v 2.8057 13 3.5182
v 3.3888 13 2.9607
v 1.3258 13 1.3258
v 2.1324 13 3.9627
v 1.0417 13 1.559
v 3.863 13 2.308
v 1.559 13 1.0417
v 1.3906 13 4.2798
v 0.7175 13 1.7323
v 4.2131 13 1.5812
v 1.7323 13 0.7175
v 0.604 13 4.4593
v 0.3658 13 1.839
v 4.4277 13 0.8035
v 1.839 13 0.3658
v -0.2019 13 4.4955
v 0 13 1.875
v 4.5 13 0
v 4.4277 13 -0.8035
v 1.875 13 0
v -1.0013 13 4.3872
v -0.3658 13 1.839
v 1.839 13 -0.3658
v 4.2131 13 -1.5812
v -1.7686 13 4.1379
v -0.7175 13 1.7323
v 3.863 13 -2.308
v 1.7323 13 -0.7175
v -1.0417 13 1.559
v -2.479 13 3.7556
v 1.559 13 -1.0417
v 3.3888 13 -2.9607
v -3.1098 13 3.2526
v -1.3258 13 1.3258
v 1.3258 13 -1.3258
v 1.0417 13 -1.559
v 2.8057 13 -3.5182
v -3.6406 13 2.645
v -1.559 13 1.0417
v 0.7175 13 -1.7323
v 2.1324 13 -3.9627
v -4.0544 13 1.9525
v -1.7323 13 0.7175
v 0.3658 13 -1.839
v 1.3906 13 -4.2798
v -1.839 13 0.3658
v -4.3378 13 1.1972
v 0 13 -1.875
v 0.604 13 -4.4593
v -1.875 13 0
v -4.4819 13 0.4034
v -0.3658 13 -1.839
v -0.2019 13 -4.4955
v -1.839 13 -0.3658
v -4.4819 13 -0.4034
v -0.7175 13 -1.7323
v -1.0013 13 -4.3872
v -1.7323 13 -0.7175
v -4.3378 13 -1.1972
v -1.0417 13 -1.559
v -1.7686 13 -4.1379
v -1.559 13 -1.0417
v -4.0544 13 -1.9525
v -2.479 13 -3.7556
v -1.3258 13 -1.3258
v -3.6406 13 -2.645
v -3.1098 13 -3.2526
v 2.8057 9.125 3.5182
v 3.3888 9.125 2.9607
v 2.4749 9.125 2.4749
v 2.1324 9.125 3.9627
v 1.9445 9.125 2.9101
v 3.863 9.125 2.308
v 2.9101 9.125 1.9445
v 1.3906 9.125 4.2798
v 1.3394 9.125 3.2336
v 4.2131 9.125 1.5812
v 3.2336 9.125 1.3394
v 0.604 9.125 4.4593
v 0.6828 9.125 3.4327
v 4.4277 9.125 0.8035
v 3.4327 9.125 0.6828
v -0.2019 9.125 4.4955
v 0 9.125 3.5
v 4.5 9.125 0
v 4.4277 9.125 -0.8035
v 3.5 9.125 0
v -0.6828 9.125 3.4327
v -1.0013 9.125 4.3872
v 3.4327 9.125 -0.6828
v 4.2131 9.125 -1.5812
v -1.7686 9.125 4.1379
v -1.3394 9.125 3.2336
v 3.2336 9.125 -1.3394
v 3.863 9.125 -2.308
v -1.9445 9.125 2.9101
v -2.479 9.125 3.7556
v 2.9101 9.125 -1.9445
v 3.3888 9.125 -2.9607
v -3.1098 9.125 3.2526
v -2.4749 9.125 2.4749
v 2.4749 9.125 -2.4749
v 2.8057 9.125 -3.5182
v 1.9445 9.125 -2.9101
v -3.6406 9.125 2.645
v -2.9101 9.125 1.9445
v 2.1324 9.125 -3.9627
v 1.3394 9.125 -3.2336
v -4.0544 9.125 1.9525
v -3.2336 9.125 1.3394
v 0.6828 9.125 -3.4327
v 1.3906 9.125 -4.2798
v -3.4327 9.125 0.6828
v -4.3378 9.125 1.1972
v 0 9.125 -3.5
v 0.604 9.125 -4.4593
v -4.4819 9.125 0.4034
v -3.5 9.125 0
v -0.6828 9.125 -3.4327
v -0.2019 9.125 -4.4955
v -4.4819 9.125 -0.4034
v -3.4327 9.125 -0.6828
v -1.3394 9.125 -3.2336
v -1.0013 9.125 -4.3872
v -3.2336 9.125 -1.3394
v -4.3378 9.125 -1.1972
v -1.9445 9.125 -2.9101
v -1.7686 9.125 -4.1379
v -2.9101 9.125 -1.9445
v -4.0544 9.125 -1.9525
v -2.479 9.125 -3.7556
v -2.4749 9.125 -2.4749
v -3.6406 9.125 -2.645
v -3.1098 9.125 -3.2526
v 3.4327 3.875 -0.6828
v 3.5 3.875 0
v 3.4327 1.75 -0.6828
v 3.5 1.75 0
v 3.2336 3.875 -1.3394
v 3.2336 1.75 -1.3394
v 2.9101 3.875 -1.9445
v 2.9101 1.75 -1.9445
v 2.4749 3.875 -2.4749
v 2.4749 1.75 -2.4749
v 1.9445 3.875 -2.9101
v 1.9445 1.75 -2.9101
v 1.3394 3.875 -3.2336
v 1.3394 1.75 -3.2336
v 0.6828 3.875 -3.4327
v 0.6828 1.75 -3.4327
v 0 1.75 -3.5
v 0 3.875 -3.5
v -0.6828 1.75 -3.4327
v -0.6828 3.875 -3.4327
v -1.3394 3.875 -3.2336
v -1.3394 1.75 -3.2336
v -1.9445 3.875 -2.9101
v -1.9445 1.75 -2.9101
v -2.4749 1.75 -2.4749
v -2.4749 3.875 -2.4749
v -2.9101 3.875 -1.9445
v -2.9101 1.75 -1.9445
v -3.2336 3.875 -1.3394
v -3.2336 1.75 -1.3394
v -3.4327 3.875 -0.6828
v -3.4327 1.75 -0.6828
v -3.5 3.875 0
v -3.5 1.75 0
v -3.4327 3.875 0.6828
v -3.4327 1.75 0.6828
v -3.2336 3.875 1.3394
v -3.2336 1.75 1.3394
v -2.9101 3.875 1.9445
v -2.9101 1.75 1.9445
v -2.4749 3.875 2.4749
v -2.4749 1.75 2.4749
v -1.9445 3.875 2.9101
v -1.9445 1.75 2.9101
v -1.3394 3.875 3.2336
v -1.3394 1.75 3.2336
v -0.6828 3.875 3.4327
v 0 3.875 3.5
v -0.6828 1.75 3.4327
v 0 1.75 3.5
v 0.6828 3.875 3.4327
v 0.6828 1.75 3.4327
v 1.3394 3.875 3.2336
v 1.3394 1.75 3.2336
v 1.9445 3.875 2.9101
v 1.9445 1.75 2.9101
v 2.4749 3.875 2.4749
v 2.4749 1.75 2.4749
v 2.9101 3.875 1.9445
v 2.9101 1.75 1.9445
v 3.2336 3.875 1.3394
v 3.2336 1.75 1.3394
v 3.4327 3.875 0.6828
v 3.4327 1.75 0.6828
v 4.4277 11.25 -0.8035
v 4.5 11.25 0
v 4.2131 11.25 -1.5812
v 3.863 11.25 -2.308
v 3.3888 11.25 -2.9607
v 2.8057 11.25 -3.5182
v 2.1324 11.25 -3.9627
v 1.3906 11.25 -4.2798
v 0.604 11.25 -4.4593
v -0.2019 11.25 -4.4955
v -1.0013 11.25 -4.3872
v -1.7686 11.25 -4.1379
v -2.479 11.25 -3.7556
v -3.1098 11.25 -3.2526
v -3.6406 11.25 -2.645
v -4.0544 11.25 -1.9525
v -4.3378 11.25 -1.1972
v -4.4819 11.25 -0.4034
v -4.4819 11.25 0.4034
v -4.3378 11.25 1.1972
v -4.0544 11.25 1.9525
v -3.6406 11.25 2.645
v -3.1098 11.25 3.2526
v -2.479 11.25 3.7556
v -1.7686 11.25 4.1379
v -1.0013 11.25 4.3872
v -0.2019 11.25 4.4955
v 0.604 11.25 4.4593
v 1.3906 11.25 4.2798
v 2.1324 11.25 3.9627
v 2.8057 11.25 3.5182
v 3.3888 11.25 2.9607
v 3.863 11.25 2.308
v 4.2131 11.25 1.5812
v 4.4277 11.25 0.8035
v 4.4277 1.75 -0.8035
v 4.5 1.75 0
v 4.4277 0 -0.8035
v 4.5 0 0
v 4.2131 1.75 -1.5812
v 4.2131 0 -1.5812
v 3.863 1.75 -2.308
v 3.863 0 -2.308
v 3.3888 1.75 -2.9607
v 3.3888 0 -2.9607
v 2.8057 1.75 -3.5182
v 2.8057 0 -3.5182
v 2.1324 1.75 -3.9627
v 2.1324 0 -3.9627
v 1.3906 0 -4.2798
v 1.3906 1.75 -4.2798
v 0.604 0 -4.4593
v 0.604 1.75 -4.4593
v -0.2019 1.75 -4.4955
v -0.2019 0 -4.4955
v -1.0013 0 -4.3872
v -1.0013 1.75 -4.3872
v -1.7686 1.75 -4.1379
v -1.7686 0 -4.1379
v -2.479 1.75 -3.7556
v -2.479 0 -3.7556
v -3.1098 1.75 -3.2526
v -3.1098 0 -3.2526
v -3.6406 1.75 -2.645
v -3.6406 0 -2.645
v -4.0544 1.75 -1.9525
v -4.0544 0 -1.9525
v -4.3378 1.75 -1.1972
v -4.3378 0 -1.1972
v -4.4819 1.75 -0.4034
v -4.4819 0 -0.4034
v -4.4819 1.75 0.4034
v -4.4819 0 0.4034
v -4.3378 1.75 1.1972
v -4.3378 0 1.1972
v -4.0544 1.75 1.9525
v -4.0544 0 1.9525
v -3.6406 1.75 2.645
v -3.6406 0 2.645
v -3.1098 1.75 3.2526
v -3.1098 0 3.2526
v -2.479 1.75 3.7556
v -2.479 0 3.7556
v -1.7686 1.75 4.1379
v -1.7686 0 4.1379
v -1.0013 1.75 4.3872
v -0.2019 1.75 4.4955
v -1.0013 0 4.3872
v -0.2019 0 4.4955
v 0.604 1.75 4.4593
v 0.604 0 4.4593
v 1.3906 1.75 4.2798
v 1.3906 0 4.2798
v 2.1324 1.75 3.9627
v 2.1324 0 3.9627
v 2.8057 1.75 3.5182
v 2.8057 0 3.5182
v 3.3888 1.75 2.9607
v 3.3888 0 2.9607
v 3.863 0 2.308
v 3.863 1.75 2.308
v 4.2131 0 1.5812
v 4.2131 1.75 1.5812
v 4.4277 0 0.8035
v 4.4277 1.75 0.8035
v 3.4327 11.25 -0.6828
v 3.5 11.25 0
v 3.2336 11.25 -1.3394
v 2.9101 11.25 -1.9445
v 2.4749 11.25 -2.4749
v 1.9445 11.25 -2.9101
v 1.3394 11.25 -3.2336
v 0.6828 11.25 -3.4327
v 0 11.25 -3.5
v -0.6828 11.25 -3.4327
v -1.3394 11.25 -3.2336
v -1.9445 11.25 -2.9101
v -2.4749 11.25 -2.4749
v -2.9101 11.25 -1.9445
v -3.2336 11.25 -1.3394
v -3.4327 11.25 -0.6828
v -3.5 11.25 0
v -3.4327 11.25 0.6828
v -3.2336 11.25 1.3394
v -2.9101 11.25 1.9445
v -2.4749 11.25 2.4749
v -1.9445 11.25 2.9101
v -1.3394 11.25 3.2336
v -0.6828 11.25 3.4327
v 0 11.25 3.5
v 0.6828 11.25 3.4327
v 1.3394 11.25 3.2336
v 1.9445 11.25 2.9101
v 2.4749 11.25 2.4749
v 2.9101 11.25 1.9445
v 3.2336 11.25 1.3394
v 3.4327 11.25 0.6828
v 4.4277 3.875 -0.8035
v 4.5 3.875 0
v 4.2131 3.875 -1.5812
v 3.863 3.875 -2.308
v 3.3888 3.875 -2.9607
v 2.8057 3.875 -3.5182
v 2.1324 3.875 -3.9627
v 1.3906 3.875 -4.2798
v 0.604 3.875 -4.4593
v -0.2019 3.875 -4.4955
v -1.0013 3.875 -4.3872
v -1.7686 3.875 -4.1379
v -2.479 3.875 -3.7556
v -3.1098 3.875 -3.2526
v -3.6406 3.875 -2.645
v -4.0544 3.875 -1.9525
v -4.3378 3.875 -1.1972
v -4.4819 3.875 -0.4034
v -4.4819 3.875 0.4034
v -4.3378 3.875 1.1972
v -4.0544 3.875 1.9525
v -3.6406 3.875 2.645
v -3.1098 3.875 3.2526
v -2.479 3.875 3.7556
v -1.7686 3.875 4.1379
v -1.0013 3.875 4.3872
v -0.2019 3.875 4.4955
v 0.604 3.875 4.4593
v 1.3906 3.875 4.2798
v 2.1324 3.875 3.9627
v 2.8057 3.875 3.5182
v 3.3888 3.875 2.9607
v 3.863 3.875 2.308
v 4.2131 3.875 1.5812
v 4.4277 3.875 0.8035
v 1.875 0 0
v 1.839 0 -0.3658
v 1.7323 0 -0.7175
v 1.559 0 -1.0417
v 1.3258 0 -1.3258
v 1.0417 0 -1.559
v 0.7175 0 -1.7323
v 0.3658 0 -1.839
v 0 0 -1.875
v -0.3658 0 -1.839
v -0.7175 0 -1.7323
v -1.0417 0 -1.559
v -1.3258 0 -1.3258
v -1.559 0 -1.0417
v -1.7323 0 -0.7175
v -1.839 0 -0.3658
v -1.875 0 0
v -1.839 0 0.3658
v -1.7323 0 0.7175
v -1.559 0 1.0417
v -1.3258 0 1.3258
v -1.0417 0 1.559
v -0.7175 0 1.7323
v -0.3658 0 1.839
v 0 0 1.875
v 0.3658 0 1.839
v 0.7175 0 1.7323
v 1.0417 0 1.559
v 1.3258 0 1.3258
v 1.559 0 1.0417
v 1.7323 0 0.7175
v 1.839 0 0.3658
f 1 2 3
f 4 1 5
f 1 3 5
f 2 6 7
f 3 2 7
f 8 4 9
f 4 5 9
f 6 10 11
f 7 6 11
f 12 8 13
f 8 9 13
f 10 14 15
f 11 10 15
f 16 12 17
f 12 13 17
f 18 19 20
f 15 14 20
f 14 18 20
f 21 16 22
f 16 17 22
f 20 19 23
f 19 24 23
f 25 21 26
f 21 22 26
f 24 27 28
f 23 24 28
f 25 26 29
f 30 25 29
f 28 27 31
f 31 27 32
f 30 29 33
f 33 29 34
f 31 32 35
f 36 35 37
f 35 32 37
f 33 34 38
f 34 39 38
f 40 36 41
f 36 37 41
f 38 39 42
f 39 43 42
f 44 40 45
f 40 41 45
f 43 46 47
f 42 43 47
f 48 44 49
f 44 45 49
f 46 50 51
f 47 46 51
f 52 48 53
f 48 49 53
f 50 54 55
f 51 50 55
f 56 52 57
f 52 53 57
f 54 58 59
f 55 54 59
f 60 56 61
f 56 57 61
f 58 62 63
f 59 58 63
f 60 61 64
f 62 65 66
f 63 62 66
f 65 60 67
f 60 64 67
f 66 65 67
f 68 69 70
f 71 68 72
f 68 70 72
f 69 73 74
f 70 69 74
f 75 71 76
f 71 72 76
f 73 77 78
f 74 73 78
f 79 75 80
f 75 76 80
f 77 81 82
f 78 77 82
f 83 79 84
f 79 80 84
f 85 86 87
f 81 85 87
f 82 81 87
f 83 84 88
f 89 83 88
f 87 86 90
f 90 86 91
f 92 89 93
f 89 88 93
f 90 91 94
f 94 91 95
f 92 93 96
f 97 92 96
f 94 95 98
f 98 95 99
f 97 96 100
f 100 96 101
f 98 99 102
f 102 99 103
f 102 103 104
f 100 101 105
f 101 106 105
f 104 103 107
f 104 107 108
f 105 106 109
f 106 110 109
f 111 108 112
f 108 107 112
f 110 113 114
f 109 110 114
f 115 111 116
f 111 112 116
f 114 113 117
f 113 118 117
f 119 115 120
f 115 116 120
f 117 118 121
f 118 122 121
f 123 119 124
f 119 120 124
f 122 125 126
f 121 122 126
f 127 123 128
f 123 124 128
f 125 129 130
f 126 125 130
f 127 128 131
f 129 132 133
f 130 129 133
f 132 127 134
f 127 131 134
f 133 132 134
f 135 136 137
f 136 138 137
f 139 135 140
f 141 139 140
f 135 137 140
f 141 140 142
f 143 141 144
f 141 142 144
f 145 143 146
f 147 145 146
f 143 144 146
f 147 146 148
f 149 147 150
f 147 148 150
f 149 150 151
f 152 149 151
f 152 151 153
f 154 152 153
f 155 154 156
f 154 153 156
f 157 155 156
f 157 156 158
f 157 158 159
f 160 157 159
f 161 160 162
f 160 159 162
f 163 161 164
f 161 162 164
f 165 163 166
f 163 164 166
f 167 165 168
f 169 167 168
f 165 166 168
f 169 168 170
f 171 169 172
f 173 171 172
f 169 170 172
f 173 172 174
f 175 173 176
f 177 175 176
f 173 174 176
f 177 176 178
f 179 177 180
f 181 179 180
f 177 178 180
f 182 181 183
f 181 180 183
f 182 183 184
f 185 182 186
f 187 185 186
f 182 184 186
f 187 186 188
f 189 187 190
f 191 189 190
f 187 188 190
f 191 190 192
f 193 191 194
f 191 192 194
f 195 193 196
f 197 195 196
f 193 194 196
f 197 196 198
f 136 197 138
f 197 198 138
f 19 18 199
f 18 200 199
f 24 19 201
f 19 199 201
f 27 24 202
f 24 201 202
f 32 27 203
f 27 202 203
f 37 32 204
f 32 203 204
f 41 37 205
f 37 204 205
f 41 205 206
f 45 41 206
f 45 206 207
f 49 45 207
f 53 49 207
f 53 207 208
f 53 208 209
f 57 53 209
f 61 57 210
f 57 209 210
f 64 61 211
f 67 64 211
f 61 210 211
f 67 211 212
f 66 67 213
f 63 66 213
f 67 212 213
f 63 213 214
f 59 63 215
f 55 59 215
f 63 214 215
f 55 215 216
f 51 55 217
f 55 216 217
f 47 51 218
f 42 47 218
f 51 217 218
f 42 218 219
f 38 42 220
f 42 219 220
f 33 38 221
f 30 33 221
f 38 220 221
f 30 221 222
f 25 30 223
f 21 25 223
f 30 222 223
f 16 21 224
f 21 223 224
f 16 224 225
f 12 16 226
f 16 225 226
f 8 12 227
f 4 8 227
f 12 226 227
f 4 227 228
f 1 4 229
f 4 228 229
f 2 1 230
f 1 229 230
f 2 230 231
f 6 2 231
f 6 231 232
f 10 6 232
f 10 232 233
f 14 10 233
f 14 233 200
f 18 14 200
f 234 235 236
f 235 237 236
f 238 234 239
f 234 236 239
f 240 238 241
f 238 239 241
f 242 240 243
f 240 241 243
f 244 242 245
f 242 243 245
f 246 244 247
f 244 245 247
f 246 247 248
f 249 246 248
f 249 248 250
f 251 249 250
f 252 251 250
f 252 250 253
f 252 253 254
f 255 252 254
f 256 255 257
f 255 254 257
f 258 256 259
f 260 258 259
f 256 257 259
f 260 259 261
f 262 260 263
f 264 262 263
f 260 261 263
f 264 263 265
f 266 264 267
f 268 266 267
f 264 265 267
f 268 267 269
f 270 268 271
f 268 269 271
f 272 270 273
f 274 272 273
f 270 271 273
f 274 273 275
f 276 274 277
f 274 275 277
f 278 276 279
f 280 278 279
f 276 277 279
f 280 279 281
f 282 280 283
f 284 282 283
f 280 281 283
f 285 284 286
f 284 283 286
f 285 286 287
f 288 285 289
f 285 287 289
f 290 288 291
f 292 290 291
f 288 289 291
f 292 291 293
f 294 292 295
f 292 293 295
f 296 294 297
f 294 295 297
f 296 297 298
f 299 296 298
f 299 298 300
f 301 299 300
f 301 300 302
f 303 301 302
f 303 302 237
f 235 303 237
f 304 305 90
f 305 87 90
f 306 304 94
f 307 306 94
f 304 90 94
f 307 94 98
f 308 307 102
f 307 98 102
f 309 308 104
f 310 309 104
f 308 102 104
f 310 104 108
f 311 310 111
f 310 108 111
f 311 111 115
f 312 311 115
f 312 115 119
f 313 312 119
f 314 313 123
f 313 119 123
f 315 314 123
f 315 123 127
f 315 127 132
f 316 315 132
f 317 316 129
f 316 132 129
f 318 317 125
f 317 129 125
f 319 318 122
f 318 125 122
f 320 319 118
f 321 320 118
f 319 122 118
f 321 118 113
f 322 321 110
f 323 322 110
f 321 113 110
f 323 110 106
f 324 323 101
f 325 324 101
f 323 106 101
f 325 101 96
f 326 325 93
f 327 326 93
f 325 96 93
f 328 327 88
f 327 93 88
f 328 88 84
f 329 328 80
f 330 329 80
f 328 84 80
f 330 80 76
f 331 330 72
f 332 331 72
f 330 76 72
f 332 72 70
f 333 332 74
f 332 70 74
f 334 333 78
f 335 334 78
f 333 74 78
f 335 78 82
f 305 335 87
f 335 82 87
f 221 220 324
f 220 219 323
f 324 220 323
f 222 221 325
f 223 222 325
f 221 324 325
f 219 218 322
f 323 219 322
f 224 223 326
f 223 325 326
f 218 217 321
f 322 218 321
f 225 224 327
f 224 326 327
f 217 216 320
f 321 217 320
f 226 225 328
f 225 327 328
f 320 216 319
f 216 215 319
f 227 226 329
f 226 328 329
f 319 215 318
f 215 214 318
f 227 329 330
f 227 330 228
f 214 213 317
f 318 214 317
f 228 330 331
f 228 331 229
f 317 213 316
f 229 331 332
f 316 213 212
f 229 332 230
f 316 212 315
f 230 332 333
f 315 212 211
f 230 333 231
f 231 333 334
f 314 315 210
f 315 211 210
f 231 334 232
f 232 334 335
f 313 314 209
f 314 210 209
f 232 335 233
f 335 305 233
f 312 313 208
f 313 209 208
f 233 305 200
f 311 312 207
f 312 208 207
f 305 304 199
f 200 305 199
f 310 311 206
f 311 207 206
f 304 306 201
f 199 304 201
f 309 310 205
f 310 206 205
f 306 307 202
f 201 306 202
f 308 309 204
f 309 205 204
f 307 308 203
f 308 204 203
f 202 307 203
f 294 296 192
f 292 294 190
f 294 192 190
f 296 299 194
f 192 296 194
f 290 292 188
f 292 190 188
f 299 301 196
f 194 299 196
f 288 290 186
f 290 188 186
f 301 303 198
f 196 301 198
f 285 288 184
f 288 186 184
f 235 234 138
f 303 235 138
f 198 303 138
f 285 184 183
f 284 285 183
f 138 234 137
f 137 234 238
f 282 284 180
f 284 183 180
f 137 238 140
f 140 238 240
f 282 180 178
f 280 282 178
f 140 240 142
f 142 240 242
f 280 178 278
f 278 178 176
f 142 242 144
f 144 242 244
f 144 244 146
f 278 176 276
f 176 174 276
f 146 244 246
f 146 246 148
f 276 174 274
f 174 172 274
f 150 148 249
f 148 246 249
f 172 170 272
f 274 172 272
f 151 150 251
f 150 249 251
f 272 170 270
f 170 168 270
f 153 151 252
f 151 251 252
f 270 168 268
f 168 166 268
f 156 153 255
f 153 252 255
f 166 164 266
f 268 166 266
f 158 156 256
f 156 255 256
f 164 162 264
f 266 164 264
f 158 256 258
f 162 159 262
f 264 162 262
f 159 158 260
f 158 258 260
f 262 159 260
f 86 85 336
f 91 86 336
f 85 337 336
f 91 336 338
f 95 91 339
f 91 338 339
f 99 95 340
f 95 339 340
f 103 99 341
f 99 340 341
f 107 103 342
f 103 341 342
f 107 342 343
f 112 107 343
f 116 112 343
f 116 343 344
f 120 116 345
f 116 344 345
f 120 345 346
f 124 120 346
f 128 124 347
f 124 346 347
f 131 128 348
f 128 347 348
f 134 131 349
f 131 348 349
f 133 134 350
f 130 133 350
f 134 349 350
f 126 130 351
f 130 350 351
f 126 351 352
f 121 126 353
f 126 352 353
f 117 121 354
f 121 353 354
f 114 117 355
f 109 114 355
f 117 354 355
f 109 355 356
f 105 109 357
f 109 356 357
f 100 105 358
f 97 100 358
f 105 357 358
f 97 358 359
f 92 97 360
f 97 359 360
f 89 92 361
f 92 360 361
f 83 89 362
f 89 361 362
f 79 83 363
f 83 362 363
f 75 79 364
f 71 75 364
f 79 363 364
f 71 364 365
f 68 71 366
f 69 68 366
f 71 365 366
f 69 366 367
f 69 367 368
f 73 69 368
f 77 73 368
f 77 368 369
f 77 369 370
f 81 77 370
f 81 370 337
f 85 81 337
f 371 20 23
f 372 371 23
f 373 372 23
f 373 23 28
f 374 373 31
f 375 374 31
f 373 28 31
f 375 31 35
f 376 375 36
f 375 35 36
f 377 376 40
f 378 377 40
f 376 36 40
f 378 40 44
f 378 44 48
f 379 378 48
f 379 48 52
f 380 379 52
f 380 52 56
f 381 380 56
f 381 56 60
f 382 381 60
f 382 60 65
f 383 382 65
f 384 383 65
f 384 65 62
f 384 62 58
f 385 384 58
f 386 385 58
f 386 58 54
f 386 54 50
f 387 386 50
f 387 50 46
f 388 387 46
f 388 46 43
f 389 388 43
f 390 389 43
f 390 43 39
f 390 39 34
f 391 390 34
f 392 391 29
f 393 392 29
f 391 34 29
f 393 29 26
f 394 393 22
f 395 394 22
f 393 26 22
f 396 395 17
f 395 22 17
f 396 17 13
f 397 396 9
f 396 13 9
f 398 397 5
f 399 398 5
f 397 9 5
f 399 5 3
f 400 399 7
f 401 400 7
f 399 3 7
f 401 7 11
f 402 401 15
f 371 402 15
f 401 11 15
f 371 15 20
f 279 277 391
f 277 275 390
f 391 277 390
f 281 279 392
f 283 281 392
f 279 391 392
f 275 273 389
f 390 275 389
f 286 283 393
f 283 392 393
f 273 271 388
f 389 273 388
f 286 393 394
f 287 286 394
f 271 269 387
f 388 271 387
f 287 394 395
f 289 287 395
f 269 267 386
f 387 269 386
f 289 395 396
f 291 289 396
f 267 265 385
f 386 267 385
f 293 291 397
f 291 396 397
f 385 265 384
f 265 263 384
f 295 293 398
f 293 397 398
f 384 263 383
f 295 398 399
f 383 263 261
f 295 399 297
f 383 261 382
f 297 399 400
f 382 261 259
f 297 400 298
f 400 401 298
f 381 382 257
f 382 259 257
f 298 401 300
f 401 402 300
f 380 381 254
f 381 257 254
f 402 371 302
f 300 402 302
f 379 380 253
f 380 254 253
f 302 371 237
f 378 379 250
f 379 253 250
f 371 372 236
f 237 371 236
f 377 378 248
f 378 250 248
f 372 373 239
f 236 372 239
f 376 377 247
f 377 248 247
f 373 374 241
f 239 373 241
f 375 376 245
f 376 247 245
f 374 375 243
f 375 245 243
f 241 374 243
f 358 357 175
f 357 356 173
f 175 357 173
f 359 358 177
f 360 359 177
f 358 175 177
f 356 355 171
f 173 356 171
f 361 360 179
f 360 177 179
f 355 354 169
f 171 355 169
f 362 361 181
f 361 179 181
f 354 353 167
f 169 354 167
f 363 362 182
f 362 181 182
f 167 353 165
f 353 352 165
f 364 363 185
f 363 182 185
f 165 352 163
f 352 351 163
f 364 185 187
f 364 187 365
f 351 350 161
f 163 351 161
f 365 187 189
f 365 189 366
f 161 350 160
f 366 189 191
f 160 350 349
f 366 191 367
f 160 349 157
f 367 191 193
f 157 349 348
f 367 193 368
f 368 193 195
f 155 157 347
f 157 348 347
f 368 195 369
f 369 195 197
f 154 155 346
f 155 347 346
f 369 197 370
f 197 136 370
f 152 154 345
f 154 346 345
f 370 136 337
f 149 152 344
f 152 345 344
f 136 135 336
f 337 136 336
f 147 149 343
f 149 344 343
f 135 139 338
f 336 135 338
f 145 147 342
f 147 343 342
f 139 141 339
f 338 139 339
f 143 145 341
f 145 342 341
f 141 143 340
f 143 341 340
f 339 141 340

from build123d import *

# Parameters (mm, degrees)
SKETCH2_R               = 1.875
CUT_EXTRUDE1_DEPTH      = 1
CUT_EXTRUDE1_DEPTH_BACK = 14


with BuildPart() as part:
    # Sketch1 → Revolve1 (revolve)
    with BuildSketch(Plane.XY):
        Polygon((0, 0), (0, 13), (4.5, 13), (4.5, 11.25), (3.5, 11.25), (3.5, 9.125), (4.5, 9.125), (4.5, 3.875), (3.5, 3.875), (3.5, 1.75), (4.5, 1.75), (4.5, 0), align=None)
    revolve(axis=Axis((0, 0, 0), (0, 1, 0)))

    # Sketch2 → Cut-Extrude1 (cut, two sides)
    with BuildSketch(Plane(origin=(0, 13, 0), x_dir=(1, 0, 0), z_dir=(0, 1, 0))) as cut_extrude1_sk:
        Circle(SKETCH2_R)
    extrude(amount=CUT_EXTRUDE1_DEPTH, mode=Mode.SUBTRACT)
    extrude(cut_extrude1_sk.sketch, amount=-CUT_EXTRUDE1_DEPTH_BACK, mode=Mode.SUBTRACT)


solid = part.part
